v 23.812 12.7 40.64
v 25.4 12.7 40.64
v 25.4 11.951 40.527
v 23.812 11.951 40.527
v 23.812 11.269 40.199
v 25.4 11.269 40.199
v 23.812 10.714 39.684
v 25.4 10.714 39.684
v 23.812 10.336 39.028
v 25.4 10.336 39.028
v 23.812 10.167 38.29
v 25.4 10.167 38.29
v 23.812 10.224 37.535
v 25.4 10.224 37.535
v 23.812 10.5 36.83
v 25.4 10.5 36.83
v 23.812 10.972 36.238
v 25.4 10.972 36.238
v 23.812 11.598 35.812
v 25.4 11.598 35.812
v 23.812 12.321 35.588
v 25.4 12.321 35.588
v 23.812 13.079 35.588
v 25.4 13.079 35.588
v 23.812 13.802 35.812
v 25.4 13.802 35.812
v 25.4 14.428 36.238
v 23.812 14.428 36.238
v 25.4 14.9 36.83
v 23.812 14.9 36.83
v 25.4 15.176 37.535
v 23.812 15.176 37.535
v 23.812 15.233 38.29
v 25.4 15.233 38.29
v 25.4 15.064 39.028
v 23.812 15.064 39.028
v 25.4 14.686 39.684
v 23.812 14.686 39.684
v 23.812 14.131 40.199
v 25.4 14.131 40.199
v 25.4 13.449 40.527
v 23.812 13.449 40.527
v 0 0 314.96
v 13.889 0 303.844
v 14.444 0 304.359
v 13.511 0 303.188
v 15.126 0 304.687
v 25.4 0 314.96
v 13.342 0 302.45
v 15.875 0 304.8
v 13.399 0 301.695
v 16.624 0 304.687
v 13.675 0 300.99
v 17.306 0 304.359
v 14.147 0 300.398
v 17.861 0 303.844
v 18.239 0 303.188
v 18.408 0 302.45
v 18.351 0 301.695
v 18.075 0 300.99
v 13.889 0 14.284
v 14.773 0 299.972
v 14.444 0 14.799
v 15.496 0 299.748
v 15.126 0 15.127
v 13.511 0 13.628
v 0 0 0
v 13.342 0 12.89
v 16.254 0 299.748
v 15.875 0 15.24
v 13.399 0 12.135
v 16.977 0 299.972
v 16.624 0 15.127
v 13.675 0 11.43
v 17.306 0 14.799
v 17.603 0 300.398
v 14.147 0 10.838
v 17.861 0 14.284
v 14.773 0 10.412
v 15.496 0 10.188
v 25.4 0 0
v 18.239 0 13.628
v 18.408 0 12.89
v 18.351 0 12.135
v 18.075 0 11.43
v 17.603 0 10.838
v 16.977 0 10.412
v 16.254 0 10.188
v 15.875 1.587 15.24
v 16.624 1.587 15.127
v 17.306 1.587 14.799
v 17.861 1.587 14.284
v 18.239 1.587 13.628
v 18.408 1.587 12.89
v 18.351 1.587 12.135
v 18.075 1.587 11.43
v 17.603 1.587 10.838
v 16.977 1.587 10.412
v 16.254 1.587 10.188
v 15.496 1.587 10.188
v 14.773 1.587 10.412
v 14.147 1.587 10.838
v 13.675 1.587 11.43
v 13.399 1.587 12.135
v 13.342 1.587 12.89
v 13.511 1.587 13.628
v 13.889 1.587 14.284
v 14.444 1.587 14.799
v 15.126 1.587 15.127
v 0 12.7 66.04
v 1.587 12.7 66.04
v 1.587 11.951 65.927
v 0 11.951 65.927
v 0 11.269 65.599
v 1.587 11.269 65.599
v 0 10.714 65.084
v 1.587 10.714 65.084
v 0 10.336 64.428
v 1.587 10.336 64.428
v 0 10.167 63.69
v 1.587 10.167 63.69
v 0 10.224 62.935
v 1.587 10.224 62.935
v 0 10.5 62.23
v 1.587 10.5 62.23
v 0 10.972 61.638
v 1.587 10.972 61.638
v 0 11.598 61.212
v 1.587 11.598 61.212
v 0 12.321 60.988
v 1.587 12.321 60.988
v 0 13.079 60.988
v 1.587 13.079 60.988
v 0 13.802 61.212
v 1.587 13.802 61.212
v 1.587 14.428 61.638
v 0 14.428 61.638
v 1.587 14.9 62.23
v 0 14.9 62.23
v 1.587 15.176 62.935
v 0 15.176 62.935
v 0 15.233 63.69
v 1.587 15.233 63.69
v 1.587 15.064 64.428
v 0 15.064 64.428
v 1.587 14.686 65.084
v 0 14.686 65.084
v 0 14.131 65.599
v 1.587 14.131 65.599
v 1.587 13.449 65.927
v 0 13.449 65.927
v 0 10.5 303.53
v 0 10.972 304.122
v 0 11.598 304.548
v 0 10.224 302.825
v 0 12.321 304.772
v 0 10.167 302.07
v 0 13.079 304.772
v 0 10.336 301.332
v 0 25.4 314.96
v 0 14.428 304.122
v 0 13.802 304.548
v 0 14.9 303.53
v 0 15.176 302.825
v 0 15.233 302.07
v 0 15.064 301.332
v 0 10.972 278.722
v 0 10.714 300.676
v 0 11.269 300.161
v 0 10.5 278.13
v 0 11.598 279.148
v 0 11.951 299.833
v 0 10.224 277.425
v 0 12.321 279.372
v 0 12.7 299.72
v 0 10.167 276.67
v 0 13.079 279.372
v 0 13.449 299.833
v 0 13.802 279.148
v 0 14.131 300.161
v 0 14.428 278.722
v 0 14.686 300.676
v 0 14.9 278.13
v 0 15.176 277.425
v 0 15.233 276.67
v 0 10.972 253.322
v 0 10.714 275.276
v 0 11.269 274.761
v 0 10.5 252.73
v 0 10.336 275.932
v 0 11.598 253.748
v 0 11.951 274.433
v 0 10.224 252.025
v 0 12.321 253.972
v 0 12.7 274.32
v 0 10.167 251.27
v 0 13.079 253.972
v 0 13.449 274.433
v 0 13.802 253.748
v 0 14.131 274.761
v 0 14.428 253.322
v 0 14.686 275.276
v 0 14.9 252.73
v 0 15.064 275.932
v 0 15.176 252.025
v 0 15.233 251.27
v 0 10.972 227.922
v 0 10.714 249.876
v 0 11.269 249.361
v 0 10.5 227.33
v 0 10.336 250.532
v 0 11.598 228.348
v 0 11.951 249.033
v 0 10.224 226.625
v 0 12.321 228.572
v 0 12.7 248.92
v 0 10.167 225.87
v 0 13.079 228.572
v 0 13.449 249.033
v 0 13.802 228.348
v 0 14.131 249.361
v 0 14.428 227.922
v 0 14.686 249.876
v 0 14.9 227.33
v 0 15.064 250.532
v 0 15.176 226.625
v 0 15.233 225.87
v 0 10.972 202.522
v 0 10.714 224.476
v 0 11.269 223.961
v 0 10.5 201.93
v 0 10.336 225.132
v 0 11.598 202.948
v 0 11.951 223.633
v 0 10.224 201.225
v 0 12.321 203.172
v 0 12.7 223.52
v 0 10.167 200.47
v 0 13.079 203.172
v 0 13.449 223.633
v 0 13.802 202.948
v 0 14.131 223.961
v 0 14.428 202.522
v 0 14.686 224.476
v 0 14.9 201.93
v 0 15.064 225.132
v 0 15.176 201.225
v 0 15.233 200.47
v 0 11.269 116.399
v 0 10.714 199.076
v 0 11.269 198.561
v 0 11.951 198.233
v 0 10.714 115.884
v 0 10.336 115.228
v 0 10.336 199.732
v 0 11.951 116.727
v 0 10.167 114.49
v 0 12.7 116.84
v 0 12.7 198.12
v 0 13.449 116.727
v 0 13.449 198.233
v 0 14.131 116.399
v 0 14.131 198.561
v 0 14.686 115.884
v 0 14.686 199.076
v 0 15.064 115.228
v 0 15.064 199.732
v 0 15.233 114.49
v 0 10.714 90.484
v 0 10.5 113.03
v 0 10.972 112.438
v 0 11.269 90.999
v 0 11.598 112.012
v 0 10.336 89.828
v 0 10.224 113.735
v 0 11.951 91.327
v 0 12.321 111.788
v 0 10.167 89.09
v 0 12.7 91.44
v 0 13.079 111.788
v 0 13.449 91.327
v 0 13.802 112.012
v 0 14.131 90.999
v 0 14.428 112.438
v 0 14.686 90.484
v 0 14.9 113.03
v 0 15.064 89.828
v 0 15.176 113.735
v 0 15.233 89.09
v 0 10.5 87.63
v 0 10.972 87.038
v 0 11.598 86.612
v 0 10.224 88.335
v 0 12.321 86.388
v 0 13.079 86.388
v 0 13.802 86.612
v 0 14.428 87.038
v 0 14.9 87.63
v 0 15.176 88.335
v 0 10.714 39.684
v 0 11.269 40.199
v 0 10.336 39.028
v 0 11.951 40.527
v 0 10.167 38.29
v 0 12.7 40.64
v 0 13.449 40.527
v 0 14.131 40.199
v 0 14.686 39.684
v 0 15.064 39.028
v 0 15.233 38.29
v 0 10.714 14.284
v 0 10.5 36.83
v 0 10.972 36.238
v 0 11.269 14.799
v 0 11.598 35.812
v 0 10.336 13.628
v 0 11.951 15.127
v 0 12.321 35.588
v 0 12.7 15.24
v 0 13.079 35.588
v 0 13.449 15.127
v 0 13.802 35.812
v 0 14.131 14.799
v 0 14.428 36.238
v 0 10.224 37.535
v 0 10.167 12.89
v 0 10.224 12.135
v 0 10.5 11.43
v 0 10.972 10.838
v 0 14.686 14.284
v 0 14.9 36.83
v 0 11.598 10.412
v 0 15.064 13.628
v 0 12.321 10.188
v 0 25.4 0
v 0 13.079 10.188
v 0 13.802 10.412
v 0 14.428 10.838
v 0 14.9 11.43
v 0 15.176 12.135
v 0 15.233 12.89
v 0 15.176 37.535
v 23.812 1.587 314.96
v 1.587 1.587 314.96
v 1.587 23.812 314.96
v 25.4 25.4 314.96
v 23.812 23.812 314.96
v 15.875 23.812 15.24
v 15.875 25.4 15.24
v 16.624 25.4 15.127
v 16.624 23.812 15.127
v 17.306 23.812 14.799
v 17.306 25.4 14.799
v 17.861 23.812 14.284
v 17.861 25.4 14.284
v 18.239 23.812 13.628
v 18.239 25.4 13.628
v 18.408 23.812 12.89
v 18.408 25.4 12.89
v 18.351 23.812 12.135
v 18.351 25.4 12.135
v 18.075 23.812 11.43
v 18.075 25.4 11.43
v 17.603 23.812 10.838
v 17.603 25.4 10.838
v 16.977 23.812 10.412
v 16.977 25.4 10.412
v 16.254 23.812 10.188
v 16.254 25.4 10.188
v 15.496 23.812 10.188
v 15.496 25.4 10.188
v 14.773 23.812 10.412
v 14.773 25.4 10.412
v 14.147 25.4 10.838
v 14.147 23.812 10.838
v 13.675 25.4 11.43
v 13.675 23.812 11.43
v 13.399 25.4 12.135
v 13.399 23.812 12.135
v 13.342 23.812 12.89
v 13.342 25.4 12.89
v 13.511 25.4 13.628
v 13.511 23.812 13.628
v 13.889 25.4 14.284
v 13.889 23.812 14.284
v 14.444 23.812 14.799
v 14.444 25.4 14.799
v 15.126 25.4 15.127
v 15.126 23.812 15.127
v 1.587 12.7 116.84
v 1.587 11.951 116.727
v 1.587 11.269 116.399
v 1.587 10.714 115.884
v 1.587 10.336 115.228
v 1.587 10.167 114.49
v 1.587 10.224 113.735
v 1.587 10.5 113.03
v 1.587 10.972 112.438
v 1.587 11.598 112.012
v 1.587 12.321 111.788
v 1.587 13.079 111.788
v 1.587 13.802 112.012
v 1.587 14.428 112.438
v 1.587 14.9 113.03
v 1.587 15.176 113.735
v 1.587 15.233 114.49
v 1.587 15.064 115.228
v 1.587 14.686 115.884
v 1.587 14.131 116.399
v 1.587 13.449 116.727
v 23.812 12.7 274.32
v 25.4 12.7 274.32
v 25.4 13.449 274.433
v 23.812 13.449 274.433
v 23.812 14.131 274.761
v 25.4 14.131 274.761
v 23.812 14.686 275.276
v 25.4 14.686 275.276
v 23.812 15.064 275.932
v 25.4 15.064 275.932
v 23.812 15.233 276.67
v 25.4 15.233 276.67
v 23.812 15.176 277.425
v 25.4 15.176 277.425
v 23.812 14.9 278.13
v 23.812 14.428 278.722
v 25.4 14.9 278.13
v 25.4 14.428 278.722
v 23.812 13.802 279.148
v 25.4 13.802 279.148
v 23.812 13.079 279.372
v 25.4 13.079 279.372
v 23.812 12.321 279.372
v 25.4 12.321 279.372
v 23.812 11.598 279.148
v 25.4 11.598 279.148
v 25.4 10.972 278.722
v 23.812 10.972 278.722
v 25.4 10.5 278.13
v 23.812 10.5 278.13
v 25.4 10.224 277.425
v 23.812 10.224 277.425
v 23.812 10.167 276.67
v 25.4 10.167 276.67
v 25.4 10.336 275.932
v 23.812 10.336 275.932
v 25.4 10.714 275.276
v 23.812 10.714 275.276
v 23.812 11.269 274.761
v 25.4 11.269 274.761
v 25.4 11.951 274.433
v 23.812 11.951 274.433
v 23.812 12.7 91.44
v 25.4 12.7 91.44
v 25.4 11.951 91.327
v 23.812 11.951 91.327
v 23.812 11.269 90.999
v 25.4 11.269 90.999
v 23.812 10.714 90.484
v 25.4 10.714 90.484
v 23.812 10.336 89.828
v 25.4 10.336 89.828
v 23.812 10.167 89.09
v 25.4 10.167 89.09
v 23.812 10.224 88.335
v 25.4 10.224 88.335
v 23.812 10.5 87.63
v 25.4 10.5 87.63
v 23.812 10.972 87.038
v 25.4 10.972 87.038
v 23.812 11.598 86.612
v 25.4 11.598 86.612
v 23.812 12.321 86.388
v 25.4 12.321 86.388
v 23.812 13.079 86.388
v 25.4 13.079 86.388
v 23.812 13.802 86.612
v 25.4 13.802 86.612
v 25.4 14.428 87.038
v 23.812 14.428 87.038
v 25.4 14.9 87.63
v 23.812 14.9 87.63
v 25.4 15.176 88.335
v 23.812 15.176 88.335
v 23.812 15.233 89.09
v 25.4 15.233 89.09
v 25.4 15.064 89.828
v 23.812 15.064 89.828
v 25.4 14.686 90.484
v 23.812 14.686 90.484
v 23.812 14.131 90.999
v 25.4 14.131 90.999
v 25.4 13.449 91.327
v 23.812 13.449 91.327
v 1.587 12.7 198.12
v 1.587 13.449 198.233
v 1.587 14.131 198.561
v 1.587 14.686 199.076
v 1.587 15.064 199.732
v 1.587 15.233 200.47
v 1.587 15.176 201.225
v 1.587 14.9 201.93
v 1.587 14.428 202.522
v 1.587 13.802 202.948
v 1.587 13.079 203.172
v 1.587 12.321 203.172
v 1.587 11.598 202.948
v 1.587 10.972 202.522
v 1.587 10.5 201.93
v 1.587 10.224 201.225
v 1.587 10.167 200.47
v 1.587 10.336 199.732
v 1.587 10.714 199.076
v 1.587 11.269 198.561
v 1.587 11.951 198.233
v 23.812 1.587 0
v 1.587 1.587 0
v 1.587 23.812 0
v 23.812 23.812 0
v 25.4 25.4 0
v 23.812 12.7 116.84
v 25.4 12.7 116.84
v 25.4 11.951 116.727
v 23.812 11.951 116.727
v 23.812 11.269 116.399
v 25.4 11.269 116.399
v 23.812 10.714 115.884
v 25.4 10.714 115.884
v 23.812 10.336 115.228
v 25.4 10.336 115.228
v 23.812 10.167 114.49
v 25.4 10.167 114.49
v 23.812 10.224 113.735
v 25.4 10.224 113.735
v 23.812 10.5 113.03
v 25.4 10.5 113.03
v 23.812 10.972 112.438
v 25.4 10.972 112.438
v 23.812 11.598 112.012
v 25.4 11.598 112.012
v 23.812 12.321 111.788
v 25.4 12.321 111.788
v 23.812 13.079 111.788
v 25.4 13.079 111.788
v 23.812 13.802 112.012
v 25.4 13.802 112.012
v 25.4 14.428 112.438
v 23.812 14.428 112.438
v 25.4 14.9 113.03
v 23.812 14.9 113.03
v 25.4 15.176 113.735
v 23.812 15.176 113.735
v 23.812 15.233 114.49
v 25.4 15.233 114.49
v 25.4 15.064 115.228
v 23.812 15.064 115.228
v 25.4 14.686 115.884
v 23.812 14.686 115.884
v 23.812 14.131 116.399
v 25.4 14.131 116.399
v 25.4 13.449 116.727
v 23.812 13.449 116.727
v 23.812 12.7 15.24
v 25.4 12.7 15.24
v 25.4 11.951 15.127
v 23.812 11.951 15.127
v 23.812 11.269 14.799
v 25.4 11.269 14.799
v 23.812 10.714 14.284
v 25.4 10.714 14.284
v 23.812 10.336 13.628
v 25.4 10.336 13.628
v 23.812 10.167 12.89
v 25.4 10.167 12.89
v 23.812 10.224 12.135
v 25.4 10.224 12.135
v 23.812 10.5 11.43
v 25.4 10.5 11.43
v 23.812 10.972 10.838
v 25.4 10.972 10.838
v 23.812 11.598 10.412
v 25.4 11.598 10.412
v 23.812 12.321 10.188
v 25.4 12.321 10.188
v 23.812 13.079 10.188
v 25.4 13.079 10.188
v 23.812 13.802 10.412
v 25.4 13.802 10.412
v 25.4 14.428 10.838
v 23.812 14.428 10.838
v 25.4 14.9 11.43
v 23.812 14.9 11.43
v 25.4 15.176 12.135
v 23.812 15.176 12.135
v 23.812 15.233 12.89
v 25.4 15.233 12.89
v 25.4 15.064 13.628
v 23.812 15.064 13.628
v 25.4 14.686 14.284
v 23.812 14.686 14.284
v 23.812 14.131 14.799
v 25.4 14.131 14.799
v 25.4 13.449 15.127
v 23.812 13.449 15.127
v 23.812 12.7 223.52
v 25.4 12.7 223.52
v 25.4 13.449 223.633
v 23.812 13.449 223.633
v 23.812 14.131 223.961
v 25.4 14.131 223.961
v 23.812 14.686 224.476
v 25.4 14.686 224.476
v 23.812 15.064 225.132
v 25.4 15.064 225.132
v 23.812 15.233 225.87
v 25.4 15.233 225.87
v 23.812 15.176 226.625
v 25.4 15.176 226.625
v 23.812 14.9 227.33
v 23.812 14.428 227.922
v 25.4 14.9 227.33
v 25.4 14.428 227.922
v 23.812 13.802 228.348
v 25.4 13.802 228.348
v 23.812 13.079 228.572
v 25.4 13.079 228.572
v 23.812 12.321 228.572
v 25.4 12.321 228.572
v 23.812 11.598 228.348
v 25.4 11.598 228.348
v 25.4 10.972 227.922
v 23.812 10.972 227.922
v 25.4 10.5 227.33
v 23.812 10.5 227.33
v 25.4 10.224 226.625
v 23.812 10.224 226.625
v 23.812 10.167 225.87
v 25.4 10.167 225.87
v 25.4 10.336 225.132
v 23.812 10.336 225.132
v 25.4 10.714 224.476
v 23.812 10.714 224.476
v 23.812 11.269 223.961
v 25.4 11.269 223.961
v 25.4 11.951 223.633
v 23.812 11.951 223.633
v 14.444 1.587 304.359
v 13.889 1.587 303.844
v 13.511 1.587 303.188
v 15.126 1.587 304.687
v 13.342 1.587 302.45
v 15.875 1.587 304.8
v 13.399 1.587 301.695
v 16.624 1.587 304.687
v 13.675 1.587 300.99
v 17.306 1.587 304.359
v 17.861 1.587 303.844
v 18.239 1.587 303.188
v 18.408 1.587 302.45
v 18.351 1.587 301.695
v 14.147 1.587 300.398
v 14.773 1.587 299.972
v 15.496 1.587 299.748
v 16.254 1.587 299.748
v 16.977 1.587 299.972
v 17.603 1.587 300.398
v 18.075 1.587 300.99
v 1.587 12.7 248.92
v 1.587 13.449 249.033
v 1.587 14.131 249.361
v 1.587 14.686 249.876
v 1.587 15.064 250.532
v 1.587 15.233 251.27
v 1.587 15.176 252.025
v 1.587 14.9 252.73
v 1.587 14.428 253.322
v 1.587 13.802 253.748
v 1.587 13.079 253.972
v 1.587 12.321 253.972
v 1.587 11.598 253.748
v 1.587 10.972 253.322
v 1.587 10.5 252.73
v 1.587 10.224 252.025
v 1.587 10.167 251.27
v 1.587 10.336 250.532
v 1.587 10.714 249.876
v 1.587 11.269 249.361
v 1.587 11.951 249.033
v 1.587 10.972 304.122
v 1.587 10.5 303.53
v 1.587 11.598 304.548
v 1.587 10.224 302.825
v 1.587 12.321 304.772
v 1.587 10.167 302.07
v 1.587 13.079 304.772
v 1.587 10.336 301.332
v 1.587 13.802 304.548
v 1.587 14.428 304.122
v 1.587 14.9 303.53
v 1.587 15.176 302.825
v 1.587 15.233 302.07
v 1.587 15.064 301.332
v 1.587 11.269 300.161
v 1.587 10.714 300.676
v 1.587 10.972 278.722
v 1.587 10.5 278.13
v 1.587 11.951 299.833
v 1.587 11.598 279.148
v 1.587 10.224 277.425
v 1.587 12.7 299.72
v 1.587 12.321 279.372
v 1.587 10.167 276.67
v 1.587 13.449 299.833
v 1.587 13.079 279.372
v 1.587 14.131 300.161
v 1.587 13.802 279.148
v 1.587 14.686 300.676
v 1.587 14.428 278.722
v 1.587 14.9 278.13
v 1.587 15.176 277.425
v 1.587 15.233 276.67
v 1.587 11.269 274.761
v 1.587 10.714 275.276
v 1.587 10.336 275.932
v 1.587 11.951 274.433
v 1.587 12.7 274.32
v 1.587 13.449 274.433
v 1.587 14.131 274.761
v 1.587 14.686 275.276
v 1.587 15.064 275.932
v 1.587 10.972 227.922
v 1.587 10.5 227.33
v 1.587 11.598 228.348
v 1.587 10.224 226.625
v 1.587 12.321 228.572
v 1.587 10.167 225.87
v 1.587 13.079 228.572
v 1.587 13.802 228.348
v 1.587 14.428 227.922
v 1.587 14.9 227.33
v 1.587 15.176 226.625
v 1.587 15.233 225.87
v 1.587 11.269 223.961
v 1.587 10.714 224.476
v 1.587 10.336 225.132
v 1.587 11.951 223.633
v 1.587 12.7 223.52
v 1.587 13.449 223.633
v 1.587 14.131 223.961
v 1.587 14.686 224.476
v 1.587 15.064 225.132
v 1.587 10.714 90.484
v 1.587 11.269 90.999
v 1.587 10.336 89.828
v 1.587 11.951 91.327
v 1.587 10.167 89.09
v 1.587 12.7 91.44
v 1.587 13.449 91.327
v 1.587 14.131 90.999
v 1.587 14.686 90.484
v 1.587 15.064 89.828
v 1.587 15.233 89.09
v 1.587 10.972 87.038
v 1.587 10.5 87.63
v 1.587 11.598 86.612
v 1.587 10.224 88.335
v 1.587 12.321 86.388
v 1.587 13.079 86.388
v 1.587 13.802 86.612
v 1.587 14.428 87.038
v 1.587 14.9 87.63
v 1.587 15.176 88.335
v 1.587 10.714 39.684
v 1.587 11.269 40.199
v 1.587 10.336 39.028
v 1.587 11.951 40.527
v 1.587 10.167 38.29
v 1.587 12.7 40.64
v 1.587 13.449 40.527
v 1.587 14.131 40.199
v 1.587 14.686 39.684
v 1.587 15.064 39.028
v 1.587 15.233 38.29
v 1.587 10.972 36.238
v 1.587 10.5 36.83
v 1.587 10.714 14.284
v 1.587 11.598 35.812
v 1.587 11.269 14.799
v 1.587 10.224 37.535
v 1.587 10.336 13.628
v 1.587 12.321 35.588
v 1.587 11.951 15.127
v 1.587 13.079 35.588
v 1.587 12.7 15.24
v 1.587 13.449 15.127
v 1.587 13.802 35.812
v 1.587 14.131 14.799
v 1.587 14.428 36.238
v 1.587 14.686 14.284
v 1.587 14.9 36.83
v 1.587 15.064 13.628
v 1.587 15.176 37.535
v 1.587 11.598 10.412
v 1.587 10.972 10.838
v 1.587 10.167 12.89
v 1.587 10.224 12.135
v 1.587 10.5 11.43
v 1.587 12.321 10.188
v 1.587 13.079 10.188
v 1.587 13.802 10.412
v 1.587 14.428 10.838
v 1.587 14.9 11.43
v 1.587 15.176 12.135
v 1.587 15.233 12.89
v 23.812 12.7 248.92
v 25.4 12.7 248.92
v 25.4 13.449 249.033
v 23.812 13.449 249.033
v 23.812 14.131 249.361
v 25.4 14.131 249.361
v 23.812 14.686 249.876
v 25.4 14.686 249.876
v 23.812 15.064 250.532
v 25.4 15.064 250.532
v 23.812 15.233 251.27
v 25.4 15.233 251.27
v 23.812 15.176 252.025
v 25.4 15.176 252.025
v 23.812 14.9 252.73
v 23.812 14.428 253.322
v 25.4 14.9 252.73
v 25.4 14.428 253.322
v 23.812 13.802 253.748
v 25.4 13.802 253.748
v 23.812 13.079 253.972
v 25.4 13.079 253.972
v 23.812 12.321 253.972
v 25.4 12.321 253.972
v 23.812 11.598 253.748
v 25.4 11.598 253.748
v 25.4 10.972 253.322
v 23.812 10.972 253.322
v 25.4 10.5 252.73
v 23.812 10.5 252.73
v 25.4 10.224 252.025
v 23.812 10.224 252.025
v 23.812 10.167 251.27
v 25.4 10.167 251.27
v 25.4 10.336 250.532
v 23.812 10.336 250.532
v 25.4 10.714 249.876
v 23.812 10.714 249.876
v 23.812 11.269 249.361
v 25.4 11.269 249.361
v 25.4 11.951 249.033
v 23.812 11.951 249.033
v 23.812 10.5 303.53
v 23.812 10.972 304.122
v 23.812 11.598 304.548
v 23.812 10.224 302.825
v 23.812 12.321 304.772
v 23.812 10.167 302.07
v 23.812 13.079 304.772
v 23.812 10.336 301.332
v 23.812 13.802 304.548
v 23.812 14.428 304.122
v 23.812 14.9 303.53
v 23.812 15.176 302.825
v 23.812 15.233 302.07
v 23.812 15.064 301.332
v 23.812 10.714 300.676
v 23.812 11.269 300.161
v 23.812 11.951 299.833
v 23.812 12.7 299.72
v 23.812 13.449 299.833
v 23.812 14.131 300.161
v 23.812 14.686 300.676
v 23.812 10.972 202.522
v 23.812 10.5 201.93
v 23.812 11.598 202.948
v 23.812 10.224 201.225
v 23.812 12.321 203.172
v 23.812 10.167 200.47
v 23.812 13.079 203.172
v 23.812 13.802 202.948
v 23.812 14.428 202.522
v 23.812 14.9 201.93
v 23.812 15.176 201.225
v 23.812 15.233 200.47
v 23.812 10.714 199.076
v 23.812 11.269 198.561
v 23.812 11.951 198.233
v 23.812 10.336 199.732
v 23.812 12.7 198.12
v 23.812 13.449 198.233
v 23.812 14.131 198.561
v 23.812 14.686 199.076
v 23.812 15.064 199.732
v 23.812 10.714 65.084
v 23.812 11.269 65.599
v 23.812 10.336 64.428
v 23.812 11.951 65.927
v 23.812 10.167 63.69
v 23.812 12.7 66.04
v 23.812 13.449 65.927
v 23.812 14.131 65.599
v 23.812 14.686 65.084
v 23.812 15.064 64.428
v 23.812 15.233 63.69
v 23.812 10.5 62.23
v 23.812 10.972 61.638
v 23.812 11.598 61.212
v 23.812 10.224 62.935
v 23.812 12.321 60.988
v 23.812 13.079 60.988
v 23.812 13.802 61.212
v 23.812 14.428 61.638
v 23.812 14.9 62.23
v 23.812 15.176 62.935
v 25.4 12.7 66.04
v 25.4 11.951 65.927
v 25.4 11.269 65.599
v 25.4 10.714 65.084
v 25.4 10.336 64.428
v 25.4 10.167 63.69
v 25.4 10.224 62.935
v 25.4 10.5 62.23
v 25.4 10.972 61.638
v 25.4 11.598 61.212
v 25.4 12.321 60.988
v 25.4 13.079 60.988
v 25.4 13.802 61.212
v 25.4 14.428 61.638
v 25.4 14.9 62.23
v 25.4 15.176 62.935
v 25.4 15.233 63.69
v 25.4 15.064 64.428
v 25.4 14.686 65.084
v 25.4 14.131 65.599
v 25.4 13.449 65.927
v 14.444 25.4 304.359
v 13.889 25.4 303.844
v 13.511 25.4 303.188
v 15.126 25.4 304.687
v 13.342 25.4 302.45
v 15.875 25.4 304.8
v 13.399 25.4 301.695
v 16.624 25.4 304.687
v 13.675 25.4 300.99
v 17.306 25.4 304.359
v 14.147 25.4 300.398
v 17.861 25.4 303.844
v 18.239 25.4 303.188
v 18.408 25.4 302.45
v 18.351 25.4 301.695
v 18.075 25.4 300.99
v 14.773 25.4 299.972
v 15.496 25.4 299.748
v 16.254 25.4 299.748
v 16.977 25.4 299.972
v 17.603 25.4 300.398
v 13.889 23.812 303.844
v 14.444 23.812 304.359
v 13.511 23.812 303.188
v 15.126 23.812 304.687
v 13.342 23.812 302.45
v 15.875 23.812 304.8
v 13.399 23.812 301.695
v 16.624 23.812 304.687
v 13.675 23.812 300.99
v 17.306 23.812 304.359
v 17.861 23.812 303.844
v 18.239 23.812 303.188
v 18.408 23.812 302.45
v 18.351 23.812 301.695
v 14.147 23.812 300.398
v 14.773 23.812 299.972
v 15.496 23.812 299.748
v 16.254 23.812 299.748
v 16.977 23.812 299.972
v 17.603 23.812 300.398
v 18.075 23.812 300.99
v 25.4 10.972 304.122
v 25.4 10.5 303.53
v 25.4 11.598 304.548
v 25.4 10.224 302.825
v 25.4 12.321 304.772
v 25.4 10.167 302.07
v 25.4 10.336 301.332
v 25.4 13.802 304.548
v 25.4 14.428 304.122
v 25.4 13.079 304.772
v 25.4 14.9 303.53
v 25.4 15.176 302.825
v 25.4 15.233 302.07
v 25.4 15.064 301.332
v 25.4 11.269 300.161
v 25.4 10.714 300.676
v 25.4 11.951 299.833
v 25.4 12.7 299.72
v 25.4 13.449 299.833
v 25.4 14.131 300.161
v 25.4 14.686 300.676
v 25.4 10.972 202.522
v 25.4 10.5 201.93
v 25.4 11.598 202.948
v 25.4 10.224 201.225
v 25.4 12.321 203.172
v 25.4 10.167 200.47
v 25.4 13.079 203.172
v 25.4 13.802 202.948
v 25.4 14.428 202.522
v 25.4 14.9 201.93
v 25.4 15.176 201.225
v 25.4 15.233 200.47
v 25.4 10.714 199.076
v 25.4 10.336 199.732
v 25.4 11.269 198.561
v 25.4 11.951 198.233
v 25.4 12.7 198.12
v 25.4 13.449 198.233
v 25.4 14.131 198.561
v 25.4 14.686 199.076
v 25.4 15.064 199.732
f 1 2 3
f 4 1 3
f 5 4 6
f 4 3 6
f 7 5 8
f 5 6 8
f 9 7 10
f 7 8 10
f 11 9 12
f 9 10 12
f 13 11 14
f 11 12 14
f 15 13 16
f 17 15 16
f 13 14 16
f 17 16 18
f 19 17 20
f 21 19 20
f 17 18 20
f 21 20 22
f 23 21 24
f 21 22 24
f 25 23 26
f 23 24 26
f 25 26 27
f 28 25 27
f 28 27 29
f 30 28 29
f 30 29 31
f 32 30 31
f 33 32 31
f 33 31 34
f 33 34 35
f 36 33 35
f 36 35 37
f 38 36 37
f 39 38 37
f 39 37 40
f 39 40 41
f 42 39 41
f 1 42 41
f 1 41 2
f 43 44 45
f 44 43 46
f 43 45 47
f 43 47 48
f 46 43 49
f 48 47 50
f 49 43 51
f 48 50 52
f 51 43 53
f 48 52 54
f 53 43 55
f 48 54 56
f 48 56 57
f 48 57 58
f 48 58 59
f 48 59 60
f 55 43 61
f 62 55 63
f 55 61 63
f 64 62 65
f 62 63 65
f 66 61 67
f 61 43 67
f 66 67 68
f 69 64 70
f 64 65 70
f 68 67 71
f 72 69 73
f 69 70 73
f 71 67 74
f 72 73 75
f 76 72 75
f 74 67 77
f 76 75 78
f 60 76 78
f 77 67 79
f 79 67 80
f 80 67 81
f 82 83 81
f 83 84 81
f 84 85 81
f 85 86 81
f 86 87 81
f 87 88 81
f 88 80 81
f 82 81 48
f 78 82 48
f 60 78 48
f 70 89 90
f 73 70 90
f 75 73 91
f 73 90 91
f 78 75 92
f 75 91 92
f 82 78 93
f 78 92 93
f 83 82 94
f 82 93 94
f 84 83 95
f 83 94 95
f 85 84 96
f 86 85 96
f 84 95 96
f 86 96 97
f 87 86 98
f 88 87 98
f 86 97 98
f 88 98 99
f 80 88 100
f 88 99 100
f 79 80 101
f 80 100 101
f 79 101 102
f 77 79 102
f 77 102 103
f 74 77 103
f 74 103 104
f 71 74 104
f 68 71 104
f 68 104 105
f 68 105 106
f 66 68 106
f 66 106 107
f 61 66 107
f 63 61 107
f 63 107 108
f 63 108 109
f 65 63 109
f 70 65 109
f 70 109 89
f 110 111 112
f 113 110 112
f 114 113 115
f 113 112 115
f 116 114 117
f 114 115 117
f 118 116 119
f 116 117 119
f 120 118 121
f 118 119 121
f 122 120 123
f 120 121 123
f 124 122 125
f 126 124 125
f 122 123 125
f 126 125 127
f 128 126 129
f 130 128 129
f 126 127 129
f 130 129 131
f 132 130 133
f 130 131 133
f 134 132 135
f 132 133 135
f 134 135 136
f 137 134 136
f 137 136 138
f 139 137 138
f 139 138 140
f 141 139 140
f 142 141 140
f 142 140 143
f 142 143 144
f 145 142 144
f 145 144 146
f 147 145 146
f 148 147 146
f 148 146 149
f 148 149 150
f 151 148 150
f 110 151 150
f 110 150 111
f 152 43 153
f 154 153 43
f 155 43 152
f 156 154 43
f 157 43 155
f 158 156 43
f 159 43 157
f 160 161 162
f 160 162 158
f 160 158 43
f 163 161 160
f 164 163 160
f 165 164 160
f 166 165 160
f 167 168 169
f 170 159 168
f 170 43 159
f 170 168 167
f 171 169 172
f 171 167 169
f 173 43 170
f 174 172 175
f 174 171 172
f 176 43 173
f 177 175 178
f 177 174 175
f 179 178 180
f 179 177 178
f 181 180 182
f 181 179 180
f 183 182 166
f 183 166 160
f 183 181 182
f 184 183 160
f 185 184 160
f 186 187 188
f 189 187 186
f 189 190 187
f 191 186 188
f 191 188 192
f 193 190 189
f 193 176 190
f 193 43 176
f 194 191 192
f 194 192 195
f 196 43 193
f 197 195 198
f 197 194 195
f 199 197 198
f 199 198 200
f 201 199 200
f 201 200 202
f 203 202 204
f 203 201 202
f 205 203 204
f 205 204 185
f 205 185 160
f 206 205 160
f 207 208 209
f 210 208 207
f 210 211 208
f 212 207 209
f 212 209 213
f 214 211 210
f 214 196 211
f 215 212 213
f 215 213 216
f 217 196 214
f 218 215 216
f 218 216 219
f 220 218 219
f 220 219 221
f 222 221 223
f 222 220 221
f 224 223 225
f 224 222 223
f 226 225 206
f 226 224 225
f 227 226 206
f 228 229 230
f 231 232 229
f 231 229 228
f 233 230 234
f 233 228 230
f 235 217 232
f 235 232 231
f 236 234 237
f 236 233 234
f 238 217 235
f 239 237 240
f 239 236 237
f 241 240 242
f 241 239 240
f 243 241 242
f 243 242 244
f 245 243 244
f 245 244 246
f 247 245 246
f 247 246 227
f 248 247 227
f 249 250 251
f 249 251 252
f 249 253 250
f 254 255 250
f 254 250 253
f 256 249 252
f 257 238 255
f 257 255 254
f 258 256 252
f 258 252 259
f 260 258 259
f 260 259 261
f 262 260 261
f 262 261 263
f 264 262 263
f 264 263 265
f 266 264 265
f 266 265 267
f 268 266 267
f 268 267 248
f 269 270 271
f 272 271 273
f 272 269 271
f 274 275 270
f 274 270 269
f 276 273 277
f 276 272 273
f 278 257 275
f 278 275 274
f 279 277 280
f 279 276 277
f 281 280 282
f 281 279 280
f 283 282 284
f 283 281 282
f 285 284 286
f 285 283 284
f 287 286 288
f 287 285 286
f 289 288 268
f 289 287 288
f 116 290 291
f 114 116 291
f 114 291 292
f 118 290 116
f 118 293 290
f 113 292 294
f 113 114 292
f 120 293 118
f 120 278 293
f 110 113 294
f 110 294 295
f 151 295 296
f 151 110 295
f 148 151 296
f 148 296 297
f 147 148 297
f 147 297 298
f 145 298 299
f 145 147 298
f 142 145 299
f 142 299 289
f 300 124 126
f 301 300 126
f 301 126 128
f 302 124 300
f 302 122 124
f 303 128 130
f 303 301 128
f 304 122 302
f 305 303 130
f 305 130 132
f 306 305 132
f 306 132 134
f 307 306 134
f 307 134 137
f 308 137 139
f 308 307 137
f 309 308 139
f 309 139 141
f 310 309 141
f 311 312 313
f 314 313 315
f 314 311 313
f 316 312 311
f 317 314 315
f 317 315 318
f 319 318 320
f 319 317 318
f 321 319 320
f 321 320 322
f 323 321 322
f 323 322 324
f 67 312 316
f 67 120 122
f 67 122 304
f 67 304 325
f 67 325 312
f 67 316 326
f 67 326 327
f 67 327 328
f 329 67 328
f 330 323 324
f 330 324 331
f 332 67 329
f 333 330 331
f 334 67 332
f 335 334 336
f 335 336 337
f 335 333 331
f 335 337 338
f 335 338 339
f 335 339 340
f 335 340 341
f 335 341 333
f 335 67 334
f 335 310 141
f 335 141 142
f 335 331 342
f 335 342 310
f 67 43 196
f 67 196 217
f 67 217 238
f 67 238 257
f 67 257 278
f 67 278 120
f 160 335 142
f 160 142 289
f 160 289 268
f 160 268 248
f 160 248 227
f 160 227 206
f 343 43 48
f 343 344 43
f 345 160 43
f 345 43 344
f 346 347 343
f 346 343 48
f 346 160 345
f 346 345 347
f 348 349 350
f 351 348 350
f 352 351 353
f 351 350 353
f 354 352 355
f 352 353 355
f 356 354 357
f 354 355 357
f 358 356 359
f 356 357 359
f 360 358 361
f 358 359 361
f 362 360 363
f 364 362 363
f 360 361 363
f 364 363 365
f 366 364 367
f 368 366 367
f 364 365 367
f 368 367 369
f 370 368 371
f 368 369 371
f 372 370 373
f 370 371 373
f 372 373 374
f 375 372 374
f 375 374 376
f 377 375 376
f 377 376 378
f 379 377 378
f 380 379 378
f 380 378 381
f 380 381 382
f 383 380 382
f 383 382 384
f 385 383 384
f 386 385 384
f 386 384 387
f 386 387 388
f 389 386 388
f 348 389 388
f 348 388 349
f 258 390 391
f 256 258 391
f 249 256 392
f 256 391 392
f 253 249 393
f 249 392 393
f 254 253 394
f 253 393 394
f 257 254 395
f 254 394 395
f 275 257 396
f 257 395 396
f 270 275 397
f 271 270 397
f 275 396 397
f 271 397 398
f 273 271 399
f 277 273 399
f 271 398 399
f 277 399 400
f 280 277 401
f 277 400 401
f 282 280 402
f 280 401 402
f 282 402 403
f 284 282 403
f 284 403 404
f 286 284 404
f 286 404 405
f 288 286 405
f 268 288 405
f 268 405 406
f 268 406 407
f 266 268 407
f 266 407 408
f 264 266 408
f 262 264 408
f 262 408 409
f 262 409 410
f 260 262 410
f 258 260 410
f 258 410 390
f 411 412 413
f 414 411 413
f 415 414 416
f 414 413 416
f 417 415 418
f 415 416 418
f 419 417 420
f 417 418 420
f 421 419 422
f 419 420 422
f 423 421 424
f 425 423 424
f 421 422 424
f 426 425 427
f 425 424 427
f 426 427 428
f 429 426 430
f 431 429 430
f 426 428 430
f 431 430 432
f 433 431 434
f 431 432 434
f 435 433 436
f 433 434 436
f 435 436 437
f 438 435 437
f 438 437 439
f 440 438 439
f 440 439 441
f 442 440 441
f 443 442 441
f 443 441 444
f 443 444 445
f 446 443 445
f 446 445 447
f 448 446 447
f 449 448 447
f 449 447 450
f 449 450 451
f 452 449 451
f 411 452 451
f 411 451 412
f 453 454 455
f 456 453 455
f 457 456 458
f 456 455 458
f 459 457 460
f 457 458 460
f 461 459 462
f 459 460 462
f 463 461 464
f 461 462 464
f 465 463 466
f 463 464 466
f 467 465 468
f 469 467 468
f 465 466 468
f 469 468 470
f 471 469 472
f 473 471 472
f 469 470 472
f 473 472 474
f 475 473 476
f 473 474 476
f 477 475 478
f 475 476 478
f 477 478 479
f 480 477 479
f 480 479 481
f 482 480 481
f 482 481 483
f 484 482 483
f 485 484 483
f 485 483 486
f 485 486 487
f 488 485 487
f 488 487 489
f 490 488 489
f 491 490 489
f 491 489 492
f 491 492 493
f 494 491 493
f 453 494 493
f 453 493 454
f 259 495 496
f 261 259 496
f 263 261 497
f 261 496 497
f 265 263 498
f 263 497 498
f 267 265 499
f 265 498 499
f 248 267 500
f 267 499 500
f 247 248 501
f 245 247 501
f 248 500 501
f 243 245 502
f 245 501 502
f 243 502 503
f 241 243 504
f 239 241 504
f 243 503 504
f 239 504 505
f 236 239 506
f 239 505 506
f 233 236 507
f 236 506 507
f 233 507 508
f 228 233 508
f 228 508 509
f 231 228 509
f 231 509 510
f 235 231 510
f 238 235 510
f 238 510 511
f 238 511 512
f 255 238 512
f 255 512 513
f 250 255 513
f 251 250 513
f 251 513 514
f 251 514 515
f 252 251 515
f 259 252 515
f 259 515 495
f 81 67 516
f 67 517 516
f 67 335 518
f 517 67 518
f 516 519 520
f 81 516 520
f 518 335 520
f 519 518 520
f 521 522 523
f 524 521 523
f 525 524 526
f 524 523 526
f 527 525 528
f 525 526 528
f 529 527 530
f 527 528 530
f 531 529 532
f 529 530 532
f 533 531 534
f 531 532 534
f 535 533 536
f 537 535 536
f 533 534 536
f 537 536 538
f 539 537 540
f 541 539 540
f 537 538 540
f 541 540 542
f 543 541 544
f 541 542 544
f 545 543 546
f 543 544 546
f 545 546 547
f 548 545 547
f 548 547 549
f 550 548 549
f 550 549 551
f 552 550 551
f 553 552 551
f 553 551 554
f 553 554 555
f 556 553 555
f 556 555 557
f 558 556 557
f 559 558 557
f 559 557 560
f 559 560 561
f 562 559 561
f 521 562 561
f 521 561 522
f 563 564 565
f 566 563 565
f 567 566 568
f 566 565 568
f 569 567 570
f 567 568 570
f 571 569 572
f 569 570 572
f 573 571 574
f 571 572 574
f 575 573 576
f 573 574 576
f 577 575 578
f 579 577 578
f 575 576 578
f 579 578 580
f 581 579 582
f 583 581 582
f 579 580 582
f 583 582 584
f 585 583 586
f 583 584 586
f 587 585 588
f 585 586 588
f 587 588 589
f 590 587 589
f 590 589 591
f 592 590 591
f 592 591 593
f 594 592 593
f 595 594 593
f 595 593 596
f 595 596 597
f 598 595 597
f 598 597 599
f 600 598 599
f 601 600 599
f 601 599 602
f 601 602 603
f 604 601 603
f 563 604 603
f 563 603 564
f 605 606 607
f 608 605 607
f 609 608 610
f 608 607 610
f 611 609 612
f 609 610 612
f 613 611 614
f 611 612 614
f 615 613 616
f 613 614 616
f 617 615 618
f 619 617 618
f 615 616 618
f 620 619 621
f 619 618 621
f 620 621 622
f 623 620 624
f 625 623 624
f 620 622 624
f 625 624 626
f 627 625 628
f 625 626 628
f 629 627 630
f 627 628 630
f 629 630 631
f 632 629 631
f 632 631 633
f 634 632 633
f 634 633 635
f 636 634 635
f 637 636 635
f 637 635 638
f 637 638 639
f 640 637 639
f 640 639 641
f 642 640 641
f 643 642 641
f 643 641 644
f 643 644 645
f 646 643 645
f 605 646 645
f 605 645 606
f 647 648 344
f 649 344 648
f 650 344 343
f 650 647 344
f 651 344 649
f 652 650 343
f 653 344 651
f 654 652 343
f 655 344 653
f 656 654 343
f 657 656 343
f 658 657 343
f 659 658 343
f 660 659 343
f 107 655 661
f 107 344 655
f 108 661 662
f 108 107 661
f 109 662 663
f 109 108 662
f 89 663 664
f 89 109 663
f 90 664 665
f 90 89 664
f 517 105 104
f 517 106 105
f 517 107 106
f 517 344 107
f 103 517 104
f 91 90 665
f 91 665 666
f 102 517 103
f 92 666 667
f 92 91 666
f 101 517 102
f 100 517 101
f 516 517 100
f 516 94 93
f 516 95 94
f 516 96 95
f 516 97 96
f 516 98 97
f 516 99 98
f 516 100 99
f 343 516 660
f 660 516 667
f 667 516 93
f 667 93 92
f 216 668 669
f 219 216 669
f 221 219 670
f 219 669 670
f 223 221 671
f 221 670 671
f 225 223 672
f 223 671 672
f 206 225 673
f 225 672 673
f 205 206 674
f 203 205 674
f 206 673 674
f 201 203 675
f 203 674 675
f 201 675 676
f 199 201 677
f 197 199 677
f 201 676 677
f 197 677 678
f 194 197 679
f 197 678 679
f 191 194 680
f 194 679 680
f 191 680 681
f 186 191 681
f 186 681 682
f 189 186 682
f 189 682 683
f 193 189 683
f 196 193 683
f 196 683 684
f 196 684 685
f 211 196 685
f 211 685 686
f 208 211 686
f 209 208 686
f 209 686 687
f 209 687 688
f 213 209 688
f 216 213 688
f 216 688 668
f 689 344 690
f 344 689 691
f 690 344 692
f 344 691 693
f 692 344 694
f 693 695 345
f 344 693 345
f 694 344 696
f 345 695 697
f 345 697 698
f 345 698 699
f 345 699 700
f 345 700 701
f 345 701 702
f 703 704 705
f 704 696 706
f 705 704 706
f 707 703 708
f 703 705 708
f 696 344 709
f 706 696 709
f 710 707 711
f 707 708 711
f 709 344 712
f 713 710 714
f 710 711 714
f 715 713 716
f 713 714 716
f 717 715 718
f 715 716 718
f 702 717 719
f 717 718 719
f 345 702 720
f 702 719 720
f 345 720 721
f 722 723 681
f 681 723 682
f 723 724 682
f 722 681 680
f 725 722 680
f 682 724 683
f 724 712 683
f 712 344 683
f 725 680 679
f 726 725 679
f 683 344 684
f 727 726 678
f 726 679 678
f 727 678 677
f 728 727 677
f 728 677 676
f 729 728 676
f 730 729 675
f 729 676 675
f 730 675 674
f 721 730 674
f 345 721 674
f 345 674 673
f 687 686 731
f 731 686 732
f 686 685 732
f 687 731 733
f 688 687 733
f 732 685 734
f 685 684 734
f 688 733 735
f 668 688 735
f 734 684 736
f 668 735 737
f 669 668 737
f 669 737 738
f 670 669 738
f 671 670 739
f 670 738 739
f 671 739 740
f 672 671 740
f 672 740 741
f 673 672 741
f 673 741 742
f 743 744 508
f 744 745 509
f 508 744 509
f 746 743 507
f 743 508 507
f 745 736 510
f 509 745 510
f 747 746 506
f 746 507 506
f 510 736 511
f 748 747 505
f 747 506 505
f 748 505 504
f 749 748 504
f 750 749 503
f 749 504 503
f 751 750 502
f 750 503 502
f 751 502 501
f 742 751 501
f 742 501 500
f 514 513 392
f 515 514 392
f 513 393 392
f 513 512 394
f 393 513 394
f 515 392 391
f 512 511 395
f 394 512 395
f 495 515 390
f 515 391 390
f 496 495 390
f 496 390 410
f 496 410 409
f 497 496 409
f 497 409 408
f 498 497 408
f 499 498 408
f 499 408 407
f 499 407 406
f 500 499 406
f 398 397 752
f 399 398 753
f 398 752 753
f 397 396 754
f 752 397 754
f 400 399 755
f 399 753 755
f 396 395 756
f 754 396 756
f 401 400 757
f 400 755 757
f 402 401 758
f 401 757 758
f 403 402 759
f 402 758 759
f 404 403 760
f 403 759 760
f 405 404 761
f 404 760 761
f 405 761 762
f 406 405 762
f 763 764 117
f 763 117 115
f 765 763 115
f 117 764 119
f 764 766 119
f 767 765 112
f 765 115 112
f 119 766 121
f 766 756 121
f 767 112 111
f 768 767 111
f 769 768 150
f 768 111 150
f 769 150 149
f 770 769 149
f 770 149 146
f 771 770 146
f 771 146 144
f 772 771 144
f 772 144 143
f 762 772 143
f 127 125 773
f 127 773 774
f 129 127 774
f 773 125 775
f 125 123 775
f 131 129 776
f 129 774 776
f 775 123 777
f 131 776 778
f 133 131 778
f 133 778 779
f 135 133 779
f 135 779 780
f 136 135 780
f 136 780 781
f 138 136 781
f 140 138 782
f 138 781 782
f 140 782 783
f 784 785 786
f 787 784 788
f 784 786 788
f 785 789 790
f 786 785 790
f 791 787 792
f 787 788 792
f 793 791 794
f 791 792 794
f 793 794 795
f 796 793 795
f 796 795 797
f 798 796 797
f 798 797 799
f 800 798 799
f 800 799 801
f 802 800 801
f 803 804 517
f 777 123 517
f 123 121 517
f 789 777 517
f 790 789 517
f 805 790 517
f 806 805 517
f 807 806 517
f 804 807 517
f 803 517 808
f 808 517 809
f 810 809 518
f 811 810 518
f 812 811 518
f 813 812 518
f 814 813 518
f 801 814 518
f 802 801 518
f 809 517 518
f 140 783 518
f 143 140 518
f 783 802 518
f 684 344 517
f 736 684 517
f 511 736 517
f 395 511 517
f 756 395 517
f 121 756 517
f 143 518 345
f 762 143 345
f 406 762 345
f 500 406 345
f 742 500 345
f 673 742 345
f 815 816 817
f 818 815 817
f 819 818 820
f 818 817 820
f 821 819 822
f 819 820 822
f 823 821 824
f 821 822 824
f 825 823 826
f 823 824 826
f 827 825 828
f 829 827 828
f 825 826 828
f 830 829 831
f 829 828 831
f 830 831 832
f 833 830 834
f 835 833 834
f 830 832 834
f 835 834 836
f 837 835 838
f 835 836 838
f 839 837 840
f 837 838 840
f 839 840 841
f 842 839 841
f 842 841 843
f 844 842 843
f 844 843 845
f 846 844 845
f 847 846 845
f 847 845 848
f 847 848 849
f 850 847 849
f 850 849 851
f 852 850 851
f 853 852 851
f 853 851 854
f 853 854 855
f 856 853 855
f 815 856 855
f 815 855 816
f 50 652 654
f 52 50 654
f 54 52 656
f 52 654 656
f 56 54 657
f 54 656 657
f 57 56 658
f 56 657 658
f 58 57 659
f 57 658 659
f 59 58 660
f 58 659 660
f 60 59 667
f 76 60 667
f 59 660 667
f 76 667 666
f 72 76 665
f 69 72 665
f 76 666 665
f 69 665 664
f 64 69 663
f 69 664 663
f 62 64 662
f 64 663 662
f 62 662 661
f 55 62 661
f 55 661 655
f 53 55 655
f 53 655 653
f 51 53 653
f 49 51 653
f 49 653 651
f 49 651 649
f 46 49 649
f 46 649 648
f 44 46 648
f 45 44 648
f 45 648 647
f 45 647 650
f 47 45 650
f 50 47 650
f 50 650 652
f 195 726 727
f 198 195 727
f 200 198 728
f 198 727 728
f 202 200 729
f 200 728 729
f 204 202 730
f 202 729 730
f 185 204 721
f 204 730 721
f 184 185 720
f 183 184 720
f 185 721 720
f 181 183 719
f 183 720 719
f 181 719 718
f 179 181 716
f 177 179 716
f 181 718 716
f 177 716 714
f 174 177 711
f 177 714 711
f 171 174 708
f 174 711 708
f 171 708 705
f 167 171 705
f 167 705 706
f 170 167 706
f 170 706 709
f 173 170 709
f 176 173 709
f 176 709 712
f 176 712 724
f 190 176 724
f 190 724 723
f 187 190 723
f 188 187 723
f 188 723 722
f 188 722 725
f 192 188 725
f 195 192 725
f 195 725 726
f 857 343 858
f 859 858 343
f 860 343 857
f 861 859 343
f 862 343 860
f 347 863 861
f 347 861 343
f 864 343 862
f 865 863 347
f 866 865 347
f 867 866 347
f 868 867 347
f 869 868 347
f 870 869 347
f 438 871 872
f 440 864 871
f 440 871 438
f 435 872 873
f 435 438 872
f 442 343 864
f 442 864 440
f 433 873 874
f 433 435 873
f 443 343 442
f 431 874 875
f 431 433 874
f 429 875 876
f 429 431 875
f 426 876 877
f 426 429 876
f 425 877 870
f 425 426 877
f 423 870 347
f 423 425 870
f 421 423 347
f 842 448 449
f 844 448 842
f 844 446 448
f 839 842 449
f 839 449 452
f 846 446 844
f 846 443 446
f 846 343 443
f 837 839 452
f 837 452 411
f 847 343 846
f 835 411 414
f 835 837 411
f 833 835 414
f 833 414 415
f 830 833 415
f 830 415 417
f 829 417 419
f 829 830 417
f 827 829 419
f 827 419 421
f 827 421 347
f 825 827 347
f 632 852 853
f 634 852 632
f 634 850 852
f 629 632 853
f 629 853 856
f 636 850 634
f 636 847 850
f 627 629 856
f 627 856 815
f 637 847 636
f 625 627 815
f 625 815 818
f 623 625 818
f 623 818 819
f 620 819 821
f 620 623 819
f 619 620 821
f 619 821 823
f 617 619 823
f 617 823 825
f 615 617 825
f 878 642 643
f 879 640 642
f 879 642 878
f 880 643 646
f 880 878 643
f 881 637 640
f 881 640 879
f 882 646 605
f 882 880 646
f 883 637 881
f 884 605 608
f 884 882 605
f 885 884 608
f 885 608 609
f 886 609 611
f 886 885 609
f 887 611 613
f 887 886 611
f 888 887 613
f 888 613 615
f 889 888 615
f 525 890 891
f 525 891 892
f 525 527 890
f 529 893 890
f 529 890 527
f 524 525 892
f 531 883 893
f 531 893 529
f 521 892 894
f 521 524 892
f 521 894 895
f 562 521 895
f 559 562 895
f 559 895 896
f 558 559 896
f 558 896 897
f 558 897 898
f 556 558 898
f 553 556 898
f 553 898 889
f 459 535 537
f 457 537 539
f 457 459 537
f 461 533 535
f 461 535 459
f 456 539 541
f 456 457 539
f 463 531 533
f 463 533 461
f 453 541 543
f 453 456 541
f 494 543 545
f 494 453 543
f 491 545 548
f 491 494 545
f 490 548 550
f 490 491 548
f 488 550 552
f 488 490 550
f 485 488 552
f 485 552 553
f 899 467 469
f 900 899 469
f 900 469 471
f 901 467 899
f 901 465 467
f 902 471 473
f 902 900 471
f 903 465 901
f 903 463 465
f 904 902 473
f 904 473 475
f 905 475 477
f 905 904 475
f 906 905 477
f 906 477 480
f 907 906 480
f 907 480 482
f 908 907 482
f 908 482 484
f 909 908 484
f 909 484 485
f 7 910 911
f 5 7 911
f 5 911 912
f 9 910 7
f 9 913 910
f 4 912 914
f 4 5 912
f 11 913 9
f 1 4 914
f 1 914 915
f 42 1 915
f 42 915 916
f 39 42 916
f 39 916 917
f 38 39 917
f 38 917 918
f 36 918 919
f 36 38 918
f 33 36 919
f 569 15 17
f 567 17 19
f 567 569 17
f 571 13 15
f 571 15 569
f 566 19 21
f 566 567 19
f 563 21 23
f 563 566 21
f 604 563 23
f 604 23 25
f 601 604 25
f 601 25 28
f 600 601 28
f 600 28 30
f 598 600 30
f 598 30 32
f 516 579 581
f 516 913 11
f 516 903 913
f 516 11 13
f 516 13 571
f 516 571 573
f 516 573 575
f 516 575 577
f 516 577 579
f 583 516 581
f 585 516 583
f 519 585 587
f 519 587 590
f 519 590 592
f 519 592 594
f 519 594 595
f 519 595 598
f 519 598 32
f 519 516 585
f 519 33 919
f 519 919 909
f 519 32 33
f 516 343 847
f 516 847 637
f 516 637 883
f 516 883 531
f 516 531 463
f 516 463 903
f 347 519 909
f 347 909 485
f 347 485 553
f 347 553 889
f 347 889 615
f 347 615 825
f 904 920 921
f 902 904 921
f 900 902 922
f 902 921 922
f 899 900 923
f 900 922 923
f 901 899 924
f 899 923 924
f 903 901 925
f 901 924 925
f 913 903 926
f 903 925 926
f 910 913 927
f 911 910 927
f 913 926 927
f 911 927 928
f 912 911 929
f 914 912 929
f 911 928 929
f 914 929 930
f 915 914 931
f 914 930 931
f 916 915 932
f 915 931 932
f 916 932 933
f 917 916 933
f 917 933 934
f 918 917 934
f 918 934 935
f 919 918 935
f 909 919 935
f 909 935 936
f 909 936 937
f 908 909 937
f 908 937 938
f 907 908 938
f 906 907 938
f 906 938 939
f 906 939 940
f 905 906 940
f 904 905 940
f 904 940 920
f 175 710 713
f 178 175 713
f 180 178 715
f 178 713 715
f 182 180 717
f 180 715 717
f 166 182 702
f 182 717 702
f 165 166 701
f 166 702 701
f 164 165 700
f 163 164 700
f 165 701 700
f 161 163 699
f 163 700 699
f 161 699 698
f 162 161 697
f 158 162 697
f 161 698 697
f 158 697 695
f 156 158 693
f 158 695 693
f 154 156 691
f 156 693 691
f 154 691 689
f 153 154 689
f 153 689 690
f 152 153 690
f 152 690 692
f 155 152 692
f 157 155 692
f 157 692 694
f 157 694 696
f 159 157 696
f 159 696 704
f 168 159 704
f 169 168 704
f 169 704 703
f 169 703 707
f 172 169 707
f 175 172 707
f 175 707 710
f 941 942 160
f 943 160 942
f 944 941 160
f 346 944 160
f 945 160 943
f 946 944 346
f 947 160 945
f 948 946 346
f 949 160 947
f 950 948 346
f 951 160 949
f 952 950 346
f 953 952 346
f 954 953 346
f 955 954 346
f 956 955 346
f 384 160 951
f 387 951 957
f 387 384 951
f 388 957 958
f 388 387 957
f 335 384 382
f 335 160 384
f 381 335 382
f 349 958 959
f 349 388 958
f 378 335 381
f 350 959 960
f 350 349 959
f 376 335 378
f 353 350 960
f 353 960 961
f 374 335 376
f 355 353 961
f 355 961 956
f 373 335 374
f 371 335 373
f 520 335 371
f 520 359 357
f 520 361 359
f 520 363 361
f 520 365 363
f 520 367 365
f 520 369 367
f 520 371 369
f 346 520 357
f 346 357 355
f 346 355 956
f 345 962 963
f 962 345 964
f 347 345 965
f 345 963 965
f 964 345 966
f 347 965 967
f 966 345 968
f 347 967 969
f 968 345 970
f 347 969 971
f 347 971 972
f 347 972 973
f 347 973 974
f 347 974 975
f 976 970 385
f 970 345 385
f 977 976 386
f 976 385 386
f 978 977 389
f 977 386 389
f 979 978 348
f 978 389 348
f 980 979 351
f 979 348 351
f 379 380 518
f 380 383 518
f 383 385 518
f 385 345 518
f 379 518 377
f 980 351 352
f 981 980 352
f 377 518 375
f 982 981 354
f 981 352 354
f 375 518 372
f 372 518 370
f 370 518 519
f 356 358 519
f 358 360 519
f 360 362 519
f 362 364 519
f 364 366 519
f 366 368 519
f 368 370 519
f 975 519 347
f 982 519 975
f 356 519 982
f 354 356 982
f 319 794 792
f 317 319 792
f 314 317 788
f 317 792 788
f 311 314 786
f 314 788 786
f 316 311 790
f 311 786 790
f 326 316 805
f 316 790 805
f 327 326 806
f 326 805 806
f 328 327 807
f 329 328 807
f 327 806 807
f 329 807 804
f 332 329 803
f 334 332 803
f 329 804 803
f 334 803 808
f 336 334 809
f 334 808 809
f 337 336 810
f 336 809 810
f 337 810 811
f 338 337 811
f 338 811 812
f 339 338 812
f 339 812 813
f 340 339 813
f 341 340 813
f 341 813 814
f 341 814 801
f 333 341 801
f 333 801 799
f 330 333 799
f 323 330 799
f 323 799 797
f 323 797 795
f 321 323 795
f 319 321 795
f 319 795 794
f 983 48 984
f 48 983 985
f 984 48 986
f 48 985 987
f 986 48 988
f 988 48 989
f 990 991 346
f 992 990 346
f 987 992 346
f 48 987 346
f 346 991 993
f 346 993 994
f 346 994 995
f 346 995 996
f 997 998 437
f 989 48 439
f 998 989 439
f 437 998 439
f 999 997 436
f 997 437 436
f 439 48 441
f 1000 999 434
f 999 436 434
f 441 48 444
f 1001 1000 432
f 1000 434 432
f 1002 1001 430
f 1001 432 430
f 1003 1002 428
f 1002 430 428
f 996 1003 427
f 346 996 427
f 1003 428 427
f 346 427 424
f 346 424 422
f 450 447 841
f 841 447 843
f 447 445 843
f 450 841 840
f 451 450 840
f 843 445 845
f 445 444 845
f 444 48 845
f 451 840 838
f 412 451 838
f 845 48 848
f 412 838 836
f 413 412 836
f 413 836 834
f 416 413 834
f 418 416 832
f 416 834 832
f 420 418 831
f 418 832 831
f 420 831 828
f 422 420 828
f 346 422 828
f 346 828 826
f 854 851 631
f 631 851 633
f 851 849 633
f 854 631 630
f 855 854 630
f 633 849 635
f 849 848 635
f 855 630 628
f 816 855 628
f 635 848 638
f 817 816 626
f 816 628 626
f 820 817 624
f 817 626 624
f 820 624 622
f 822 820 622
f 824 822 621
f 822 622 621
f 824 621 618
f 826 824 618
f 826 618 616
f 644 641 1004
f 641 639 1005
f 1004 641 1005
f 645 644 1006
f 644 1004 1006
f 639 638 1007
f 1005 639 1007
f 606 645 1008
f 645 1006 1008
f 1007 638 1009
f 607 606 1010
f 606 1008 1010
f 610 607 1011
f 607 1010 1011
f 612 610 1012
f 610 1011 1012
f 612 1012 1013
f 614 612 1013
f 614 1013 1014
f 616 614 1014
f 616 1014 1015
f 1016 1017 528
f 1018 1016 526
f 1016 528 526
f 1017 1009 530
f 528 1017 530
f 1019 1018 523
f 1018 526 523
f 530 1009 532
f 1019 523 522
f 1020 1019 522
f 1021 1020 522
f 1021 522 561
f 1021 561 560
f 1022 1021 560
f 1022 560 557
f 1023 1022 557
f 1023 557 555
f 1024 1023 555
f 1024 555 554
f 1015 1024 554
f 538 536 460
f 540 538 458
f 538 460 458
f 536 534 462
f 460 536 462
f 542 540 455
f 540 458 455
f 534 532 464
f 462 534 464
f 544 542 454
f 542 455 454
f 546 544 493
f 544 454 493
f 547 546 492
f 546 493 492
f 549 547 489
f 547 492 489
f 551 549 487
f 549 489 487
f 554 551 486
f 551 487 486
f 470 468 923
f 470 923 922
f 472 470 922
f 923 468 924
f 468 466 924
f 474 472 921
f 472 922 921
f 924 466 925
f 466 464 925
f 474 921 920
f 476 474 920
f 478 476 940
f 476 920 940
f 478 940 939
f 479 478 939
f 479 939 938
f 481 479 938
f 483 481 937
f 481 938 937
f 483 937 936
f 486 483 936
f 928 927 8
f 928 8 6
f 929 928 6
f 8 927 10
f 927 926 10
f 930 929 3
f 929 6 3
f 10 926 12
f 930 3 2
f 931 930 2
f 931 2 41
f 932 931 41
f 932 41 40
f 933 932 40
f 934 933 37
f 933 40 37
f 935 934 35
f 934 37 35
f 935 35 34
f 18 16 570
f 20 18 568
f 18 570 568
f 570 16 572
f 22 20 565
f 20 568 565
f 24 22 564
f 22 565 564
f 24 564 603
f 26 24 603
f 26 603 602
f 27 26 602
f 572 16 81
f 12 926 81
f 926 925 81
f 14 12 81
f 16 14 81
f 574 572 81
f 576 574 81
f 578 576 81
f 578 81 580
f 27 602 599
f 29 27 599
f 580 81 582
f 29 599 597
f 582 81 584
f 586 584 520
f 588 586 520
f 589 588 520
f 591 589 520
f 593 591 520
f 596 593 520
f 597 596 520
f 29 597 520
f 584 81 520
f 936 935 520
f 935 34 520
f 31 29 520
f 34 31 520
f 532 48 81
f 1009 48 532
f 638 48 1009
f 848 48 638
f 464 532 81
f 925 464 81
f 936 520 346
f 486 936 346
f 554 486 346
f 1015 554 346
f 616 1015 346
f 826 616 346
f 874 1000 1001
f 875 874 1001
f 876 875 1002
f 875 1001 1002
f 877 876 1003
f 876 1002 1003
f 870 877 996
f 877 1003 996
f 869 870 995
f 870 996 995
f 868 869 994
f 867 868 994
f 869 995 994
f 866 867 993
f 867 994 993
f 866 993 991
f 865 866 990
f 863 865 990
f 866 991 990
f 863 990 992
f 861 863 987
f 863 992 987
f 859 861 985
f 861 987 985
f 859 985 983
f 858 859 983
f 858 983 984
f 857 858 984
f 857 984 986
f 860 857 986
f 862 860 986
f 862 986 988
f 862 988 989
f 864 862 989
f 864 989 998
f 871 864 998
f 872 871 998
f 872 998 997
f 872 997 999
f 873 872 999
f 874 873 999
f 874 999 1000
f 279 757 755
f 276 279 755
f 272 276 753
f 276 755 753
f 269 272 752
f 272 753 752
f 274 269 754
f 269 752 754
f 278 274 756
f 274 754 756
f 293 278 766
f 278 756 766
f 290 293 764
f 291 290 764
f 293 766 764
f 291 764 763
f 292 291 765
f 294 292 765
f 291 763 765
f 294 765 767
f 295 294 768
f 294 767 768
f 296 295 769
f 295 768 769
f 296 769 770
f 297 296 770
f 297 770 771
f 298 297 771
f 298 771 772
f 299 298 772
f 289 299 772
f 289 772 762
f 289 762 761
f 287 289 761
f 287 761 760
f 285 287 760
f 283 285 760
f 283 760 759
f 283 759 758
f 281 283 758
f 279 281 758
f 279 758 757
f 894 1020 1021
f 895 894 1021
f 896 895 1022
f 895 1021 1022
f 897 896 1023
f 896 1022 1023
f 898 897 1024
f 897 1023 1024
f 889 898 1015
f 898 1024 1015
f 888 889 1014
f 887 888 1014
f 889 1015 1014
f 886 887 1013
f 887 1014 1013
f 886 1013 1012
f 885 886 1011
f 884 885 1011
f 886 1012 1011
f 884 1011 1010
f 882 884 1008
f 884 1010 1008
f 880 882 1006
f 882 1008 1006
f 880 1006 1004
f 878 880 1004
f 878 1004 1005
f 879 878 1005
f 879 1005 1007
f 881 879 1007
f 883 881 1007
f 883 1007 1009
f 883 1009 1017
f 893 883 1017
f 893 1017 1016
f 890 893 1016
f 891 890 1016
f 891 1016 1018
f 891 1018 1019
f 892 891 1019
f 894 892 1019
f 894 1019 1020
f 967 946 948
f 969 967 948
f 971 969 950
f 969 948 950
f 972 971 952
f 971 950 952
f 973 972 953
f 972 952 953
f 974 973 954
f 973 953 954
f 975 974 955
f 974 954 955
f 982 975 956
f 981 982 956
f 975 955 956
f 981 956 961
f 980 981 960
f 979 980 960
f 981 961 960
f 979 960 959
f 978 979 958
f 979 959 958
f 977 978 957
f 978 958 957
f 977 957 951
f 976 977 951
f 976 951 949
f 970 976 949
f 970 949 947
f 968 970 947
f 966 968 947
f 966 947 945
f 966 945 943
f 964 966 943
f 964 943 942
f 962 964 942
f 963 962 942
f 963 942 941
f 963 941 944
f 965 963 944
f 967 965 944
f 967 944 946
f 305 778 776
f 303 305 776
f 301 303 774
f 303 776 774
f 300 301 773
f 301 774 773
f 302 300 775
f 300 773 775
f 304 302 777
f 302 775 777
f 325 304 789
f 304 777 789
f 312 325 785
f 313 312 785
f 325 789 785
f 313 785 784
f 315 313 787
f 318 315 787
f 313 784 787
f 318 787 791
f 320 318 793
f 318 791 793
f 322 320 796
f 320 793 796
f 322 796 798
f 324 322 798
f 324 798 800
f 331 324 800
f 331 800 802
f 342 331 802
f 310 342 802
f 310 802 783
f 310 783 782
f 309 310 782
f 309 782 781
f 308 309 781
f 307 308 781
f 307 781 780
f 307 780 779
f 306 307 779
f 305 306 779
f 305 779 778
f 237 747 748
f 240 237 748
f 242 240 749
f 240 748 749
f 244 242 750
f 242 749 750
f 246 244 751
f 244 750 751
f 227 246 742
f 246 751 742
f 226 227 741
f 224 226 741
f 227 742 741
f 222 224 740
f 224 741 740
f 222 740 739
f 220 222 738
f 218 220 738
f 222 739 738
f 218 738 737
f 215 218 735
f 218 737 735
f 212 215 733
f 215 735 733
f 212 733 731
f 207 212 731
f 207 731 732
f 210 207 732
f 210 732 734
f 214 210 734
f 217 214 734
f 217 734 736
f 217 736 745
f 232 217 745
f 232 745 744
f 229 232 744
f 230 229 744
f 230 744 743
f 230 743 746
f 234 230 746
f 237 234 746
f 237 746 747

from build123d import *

# Parameters (mm, degrees)
SKETCH1_W           = 25.4
SKETCH1_H           = 25.4
SKETCH1_W_2         = 22.225
SKETCH1_H_2         = 22.225
BOSS_EXTRUDE1_DEPTH = 314.96
SKETCH3_R           = 2.54
CUT_EXTRUDE2_DEPTH  = 318.00176908
SKETCH4_R           = 2.54
CUT_EXTRUDE3_DEPTH  = 318.00176908


with BuildPart() as part:
    # Sketch1 → Boss-Extrude1 (new body)
    with BuildSketch(Plane.XY):
        with Locations((12.7, 12.7)):
            Rectangle(SKETCH1_W, SKETCH1_H)
        with Locations((12.7, 12.7)):
            Rectangle(SKETCH1_W_2, SKETCH1_H_2, mode=Mode.SUBTRACT)
    extrude(amount=BOSS_EXTRUDE1_DEPTH)

    # Sketch3 → Cut-Extrude2 (cut, through all)
    with BuildSketch(Plane(origin=(0, 25.4, 0), x_dir=(1, 0, 0), z_dir=(0, 1, 0))):
        with Locations(Location((15.875, -302.26, 0), (0, 0, 270))):
            Circle(SKETCH3_R)
        with Locations(Location((15.875, -12.7, 0), (0, 0, 270))):
            Circle(SKETCH3_R)
    extrude(amount=-CUT_EXTRUDE2_DEPTH, mode=Mode.SUBTRACT)

    # Sketch4 → Cut-Extrude3 (cut, through all)
    with BuildSketch(Plane(origin=(25.4, 0, 0), x_dir=(0, 0, -1), z_dir=(1, 0, 0))):
        with Locations((-302.26, 12.7)):
            Circle(SKETCH4_R)
        with Locations((-276.86, 12.7)):
            Circle(SKETCH4_R)
        with Locations((-251.46, 12.7)):
            Circle(SKETCH4_R)
        with Locations((-226.06, 12.7)):
            Circle(SKETCH4_R)
        with Locations((-200.66, 12.7)):
            Circle(SKETCH4_R)
        with Locations(Location((-114.3, 12.7, 0), (0, 0, 180))):
            Circle(SKETCH4_R)
        with Locations(Location((-88.9, 12.7, 0), (0, 0, 180))):
            Circle(SKETCH4_R)
        with Locations(Location((-63.5, 12.7, 0), (0, 0, 180))):
            Circle(SKETCH4_R)
        with Locations(Location((-38.1, 12.7, 0), (0, 0, 180))):
            Circle(SKETCH4_R)
        with Locations(Location((-12.7, 12.7, 0), (0, 0, 180))):
            Circle(SKETCH4_R)
    extrude(amount=-CUT_EXTRUDE3_DEPTH, mode=Mode.SUBTRACT)


solid = part.part
